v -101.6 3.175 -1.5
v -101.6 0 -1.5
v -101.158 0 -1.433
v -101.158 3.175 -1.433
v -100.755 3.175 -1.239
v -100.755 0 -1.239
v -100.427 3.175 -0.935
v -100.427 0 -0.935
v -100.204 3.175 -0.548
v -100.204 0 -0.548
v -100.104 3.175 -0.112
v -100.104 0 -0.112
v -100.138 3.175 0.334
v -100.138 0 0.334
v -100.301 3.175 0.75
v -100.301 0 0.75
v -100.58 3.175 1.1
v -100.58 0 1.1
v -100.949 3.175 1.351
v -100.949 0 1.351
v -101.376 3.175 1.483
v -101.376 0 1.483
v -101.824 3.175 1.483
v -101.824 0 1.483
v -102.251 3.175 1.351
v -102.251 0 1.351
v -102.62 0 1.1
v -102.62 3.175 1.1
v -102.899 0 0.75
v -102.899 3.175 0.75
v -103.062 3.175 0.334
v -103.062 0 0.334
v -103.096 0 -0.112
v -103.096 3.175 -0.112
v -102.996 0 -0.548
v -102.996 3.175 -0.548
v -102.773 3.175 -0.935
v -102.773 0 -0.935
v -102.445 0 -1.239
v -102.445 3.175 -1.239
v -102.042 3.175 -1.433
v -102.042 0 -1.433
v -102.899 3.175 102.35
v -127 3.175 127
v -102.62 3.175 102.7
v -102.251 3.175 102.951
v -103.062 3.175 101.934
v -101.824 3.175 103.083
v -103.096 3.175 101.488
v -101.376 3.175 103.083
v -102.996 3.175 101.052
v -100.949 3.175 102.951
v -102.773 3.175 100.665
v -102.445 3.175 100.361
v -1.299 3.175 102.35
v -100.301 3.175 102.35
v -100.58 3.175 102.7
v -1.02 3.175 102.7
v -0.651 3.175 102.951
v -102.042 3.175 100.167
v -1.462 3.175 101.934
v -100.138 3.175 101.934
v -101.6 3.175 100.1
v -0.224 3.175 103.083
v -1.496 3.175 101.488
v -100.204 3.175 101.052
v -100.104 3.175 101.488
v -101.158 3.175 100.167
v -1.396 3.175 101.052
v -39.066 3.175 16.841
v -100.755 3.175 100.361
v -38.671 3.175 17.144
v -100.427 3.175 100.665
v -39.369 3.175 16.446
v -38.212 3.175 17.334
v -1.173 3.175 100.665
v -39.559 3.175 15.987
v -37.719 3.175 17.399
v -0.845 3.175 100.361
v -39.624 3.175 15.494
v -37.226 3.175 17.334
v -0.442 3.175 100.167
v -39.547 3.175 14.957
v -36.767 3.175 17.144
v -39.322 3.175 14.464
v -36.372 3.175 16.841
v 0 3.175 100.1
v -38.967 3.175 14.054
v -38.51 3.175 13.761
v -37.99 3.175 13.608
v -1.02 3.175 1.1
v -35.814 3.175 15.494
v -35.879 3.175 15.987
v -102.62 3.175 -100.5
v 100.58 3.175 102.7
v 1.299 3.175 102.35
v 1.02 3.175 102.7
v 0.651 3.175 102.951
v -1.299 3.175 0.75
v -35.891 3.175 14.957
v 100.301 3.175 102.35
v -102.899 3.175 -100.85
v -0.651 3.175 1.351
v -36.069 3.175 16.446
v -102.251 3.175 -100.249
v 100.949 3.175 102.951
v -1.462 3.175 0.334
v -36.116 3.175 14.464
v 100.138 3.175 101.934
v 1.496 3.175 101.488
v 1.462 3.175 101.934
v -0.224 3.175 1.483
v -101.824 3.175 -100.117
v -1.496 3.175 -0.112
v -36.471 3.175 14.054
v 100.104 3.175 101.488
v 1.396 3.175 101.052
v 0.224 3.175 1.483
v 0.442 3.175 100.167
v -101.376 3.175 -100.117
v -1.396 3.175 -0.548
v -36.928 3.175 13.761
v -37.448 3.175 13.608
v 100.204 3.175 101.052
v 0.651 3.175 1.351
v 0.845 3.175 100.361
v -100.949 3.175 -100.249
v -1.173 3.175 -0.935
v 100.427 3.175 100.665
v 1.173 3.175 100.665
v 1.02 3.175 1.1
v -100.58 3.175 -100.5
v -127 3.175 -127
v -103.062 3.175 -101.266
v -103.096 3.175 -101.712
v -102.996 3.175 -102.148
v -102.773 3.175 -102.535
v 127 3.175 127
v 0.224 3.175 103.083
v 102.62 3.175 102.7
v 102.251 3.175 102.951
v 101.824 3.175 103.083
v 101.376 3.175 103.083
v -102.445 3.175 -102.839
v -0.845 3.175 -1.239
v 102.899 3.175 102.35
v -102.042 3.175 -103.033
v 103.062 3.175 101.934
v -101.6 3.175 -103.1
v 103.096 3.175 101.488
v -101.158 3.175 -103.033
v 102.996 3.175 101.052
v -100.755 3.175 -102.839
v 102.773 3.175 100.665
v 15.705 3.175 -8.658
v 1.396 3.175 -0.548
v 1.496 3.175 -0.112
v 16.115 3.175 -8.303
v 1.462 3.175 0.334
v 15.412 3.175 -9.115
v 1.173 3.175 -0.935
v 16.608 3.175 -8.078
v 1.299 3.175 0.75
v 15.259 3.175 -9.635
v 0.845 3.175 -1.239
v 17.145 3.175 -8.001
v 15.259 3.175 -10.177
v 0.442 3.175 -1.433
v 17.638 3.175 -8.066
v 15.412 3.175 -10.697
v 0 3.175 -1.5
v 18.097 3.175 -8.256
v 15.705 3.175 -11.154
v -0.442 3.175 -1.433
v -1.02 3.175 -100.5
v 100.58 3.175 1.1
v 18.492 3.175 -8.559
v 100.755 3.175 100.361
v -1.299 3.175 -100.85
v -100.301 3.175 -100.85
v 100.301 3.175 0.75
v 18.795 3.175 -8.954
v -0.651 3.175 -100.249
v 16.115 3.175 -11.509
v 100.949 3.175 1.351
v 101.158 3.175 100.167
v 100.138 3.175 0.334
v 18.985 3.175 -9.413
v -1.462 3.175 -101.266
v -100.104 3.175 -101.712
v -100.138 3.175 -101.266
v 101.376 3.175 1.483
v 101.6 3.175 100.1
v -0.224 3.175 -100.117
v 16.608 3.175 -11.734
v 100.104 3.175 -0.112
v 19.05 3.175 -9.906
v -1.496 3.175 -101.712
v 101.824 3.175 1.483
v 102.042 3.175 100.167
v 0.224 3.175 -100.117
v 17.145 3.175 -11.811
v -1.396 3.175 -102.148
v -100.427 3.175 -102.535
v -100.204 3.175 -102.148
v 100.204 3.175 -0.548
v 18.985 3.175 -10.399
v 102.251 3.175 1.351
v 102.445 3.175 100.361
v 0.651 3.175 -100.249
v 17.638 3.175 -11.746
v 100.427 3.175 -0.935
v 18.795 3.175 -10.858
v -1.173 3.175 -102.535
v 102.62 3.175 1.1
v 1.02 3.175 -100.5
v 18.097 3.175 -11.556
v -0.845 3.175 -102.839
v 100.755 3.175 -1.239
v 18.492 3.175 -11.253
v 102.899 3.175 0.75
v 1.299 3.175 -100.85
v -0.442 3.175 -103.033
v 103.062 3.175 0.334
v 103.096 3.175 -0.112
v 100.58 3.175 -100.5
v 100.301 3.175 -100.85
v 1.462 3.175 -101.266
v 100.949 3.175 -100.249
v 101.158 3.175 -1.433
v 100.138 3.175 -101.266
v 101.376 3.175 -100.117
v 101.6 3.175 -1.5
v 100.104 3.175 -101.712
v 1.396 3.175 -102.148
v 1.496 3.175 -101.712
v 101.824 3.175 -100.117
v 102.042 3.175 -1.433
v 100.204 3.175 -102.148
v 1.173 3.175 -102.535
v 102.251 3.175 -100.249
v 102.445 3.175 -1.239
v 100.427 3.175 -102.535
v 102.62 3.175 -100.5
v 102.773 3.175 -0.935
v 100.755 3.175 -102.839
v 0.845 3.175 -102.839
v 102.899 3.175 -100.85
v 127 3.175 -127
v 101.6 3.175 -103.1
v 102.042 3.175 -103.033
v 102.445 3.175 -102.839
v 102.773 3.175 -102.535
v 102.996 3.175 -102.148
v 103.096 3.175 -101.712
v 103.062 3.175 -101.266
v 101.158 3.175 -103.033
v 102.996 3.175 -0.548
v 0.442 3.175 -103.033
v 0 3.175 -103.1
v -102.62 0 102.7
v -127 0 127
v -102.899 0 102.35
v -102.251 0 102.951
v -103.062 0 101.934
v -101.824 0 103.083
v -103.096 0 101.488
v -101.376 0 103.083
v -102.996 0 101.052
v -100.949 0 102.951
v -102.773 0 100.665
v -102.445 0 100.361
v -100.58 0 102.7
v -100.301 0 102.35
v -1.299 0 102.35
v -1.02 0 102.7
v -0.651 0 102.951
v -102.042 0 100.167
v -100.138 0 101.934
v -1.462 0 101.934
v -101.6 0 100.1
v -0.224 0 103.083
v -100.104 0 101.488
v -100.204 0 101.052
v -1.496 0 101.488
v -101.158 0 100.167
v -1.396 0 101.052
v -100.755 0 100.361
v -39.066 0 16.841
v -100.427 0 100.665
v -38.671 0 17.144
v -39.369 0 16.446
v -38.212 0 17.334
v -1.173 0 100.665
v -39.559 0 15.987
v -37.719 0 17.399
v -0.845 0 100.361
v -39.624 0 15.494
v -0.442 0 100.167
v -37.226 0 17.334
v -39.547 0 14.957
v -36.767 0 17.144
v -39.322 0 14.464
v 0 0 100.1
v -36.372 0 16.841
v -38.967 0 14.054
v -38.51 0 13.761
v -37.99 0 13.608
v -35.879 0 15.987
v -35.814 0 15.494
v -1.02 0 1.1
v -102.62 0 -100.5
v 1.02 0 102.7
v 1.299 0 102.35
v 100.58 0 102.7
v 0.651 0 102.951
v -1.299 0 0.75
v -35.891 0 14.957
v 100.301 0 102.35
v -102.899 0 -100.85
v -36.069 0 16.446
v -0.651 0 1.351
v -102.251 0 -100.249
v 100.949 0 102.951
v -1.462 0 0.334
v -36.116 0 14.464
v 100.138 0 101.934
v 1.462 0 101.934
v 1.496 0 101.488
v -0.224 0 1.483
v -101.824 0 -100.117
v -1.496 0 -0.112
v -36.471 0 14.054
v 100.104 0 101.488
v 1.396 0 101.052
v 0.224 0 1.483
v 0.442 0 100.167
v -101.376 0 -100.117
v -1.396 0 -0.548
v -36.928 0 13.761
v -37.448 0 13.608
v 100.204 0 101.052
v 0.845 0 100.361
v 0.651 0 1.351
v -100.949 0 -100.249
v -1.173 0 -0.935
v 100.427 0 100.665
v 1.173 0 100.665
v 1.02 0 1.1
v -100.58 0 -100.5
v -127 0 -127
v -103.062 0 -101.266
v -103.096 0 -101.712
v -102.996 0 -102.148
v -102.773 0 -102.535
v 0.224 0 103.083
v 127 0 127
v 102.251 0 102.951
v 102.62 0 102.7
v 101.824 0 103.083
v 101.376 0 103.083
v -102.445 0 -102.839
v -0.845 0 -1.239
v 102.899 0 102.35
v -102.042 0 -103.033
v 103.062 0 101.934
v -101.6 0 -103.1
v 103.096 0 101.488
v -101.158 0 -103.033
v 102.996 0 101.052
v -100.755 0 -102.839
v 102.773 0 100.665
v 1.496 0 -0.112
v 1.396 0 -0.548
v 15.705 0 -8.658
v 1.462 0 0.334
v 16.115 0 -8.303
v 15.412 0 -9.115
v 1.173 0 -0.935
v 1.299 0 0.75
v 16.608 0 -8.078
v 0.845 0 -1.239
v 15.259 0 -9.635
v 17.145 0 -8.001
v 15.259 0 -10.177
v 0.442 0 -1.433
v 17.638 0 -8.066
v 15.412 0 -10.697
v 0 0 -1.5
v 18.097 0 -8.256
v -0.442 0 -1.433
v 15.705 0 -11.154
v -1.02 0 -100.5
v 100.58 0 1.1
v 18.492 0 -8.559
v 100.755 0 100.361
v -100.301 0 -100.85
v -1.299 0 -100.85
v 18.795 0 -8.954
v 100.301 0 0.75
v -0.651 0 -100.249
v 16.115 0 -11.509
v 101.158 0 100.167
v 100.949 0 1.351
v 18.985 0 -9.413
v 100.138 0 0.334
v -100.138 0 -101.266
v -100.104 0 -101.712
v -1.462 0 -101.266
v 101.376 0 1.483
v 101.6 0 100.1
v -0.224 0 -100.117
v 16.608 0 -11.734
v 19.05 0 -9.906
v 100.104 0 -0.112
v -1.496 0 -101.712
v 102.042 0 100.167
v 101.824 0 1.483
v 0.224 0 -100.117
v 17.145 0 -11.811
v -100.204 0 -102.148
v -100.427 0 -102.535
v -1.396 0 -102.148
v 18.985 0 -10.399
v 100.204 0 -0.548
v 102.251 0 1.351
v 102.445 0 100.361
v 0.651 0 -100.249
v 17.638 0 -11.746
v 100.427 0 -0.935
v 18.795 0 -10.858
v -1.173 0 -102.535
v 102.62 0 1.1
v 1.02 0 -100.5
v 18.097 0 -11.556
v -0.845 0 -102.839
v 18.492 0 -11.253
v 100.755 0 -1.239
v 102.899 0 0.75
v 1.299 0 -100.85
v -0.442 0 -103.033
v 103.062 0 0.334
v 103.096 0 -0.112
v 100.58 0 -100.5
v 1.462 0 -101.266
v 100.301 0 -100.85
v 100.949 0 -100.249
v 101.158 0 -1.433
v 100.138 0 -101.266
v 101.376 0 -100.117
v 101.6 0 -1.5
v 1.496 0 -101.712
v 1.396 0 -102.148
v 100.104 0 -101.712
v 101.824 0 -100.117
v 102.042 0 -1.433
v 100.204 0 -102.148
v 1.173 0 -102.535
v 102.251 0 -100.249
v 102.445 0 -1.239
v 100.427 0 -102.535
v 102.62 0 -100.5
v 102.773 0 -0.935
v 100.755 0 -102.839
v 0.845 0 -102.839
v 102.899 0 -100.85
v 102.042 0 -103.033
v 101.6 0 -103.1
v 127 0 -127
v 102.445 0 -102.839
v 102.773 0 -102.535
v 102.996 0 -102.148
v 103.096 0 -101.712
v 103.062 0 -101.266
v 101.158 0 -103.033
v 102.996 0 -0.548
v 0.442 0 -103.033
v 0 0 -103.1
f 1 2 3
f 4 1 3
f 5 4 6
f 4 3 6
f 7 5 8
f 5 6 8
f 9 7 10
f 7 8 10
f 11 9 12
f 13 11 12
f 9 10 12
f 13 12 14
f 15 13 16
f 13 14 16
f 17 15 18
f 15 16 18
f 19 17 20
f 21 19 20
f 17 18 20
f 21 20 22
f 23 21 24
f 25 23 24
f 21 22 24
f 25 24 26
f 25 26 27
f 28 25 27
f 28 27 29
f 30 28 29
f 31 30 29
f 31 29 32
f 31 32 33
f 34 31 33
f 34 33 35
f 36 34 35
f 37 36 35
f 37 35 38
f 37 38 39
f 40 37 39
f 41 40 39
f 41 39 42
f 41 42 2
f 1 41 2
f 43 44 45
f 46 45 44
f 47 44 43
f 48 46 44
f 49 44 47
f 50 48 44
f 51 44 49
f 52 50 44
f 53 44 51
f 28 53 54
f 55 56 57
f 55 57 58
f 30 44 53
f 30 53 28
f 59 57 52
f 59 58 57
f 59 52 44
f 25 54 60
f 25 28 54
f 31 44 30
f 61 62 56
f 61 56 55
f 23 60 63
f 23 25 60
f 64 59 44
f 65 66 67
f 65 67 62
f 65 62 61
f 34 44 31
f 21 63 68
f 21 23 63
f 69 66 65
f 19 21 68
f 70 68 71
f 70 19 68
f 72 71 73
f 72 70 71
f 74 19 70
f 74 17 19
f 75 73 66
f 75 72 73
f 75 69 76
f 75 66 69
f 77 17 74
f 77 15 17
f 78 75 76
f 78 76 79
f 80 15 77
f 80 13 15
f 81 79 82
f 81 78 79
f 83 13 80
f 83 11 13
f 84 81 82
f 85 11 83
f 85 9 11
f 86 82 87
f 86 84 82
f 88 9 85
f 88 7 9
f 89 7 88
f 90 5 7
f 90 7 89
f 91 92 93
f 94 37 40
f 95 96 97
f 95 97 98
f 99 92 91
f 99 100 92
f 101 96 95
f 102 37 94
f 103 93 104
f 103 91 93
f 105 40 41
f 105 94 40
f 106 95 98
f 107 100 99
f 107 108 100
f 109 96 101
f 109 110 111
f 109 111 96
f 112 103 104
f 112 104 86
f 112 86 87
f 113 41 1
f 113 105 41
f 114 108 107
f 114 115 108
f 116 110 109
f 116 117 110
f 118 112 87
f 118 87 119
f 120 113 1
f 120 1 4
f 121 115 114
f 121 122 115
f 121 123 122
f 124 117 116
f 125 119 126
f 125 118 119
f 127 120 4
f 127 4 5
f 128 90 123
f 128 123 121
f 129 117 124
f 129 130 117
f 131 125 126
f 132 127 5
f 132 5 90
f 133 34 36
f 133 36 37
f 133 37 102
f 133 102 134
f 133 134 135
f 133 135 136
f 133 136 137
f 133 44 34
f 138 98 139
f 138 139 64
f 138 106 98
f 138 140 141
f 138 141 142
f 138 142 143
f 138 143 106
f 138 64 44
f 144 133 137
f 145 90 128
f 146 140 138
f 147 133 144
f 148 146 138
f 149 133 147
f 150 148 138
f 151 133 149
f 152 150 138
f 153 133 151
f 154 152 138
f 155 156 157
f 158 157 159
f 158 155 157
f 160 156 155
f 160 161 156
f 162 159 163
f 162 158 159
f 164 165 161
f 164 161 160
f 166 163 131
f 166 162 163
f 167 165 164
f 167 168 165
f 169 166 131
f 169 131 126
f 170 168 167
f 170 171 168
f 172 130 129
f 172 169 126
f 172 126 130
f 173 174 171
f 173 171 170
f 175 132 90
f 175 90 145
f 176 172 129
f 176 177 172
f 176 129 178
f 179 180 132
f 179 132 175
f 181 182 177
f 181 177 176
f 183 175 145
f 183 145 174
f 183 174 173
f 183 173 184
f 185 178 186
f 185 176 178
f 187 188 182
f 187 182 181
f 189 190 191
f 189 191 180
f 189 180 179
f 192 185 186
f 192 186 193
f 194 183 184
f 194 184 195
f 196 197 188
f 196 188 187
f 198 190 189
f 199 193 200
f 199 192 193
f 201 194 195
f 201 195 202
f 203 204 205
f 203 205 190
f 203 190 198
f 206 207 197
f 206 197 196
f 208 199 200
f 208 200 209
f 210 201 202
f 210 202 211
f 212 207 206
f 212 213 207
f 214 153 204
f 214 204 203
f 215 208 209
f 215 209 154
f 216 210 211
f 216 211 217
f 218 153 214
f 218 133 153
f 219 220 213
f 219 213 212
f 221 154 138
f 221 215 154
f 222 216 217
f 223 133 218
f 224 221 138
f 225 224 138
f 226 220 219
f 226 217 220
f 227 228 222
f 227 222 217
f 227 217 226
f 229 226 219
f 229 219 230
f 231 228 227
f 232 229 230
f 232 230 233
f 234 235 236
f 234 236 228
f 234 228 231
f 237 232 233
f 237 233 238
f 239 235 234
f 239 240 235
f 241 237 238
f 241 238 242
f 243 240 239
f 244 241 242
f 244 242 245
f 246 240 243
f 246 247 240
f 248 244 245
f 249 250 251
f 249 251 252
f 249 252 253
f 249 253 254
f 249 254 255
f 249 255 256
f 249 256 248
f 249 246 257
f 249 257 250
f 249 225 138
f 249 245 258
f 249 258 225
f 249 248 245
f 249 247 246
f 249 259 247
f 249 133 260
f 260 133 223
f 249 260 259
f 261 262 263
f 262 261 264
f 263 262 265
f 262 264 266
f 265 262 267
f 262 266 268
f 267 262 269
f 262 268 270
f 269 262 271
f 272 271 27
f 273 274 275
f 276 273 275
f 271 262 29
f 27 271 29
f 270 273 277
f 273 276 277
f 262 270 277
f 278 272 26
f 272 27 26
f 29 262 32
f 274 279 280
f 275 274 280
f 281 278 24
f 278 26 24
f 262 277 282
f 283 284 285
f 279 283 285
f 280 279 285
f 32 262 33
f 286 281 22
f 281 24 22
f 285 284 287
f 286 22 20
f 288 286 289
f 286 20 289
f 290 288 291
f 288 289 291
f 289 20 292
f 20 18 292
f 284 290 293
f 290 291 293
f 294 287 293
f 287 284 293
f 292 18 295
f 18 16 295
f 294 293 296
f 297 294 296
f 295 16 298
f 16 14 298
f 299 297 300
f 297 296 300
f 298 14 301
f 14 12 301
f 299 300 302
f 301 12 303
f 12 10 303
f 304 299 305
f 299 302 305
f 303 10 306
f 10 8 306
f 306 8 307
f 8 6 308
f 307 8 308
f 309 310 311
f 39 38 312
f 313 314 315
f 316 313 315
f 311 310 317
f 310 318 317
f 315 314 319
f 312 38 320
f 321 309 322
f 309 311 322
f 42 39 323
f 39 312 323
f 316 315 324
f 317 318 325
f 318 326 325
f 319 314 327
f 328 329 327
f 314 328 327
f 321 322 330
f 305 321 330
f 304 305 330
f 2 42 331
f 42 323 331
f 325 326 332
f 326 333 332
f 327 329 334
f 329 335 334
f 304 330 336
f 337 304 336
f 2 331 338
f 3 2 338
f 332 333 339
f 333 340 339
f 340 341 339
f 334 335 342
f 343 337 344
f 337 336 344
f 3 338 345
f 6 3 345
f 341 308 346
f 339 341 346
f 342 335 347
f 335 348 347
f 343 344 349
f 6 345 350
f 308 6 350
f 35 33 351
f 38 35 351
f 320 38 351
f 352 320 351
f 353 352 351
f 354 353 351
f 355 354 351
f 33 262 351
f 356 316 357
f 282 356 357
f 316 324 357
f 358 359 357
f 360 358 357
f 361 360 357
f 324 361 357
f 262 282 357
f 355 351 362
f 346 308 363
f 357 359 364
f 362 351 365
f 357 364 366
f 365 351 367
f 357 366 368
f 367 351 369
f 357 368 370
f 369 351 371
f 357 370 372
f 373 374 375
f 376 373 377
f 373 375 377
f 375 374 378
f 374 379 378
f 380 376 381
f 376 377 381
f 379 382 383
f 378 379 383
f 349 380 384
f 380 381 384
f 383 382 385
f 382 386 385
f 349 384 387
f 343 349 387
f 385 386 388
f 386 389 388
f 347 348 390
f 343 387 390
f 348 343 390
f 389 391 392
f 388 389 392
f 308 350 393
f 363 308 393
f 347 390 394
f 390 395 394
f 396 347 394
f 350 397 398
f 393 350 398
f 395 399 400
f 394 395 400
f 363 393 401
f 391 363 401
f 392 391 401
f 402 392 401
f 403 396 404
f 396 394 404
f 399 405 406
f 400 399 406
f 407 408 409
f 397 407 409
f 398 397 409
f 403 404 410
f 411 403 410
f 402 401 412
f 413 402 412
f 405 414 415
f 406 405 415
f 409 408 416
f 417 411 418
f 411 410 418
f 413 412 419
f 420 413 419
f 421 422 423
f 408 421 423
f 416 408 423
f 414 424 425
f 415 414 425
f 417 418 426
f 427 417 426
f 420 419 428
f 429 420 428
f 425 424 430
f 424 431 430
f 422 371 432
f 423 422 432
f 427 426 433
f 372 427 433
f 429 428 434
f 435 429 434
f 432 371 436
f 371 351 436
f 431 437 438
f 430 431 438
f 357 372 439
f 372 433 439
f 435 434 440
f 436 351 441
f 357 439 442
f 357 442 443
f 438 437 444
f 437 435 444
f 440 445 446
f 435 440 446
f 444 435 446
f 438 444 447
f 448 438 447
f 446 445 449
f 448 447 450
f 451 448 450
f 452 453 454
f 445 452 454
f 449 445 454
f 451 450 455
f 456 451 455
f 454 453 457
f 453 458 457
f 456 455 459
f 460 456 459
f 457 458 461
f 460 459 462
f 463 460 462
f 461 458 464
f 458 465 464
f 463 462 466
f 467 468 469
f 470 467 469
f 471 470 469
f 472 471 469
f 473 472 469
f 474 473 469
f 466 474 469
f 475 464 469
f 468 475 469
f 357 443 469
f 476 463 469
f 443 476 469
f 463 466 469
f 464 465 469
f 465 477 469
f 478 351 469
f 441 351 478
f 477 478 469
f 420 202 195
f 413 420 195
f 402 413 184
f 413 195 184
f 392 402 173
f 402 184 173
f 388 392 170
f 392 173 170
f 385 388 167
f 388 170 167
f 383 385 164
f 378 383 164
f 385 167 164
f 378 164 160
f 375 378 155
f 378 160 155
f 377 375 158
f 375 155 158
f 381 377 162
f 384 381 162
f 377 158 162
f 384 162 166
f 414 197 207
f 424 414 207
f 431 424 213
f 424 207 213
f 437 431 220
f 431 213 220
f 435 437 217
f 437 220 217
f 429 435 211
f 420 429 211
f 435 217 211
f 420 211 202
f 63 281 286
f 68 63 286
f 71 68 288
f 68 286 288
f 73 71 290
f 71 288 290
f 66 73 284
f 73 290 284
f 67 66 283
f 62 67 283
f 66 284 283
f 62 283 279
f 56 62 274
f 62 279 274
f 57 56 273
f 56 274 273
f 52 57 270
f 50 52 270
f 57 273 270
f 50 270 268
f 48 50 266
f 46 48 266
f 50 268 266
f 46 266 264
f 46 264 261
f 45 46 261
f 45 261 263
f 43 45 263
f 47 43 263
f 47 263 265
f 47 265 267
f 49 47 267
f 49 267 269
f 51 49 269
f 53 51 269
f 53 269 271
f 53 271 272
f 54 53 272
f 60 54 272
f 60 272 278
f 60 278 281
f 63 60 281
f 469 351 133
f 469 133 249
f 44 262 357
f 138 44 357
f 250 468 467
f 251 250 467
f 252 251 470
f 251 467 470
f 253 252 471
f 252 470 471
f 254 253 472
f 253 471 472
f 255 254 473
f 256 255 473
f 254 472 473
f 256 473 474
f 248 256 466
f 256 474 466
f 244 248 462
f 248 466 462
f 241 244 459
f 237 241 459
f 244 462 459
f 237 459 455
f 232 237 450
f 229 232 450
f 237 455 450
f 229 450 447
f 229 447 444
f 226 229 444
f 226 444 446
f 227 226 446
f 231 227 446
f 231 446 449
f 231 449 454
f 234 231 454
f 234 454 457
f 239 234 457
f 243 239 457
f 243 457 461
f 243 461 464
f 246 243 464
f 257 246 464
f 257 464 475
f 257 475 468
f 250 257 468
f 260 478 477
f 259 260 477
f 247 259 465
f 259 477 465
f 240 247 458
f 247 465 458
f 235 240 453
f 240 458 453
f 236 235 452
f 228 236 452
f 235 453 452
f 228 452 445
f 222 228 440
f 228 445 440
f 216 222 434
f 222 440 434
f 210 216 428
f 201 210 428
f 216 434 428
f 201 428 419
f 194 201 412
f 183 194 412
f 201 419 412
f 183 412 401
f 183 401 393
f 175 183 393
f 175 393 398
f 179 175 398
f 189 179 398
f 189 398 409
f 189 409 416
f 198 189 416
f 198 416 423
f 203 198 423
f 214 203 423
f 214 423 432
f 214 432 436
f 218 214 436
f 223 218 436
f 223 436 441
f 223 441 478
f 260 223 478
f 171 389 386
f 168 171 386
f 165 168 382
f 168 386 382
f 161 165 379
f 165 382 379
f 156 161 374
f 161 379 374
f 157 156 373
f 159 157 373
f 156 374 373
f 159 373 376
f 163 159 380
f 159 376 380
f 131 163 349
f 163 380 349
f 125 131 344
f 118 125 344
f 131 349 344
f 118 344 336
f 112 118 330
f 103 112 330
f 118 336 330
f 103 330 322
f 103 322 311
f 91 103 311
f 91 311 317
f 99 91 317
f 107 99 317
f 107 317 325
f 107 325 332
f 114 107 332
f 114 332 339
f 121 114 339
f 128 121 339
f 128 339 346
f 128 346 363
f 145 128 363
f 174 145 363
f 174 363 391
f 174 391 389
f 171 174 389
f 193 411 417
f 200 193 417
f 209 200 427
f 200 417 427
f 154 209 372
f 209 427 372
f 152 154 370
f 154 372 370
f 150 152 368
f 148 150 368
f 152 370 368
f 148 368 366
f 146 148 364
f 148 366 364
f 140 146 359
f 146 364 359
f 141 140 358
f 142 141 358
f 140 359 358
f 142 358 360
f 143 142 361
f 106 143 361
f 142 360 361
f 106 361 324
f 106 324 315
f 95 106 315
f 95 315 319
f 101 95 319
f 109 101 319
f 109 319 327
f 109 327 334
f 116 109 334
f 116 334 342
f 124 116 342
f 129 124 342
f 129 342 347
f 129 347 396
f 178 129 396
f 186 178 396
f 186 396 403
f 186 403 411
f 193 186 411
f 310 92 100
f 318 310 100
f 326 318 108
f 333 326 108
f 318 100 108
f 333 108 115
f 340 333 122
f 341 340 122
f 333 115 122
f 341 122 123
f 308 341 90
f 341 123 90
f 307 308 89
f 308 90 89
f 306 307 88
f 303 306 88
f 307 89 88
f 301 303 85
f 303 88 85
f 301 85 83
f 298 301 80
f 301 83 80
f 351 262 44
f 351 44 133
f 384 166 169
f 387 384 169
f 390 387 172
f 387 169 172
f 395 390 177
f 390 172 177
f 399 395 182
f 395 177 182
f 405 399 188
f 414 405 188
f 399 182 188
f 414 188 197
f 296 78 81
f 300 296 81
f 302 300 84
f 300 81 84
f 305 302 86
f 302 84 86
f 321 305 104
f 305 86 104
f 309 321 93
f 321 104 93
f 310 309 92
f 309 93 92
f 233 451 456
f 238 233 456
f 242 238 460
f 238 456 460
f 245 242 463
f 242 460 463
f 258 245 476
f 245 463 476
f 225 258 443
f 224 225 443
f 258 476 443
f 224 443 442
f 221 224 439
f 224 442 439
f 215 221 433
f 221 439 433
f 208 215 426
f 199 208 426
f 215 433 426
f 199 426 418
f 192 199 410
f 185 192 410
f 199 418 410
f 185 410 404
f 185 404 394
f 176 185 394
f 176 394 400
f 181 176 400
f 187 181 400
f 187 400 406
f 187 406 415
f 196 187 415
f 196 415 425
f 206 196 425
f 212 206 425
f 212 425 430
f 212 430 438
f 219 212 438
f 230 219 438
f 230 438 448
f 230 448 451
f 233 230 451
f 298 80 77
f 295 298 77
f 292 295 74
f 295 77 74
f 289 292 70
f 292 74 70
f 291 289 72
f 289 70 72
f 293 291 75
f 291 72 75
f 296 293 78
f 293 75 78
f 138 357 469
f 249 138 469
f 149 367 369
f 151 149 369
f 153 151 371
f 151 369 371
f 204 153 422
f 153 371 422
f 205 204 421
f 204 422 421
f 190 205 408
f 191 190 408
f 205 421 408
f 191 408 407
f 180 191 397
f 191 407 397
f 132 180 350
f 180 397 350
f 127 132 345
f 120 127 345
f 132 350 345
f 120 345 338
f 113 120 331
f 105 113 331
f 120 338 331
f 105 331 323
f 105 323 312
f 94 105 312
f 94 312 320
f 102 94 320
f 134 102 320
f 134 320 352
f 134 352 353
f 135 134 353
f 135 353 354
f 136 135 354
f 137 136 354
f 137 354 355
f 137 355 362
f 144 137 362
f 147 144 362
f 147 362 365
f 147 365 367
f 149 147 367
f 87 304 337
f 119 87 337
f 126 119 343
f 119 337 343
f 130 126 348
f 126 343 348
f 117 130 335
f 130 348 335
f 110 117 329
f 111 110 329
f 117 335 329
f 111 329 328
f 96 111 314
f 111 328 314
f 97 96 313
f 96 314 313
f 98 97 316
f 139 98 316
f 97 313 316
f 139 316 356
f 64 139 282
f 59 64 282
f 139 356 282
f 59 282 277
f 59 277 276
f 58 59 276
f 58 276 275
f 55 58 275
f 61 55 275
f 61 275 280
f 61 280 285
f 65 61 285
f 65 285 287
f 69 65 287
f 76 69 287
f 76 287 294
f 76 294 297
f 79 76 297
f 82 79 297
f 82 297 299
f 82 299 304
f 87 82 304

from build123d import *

# Parameters (mm, degrees)
SKETCH1_W             = 254
SKETCH1_H             = 254
BOSS_EXTRUDE1_DEPTH   = 3.175
F_3_0MM_DOWEL_HOLE1_D = 3
CUT_EXTRUDE1_DEPTH    = 180.63318353


with BuildPart() as part:
    # Sketch1 → Boss-Extrude1 (new body)
    with BuildSketch(Plane(origin=(0, 0, 0), x_dir=(1, 0, 0), z_dir=(0, 1, 0))):
        Rectangle(SKETCH1_W, SKETCH1_H)
    extrude(amount=BOSS_EXTRUDE1_DEPTH)

    # Ø3.0mm Dowel Hole1 (through all)
    with Locations(Plane.ZX.offset(3.175)):
        with Locations((0, 0), (0, -101.6), (0, 101.6), (101.6, 101.6), (101.6, 0), (101.6, -101.6), (-101.6, -101.6), (-101.6, 0), (-101.6, 101.6)):
            Hole(F_3_0MM_DOWEL_HOLE1_D / 2)

    # Sketch5 → Cut-Extrude1 (cut, through all)
    with BuildSketch(Plane(origin=(0, 3.175, 0), x_dir=(1, 0, 0), z_dir=(0, 1, 0))):
        with BuildLine():
            ThreePointArc((17.145, 11.811), (15.24, 9.906), (17.145, 8.001))
            Line((17.145, 8.001), (17.145, 9.906))
            Line((17.145, 9.906), (17.145, 11.811))
        make_face()
        with BuildLine():
            Line((17.145, 9.906), (17.145, 8.001))
            ThreePointArc((17.145, 8.001), (18.492038418, 8.558961582), (19.05, 9.906))
            Line((19.05, 9.906), (17.145, 9.906))
        make_face()
        with BuildLine():
            Line((17.145, 11.811), (17.145, 9.906))
            Line((17.145, 9.906), (19.05, 9.906))
            ThreePointArc((19.05, 9.906), (18.492038418, 11.253038418), (17.145, 11.811))
        make_face()
        with BuildLine():
            ThreePointArc((-39.624, -15.494), (-39.066038418, -16.841038418), (-37.719, -17.399))
            Line((-37.719, -17.399), (-37.719, -15.494))
            Line((-37.719, -15.494), (-39.624, -15.494))
        make_face()
        with BuildLine():
            Line((-37.719, -15.494), (-37.719, -17.399))
            ThreePointArc((-37.719, -17.399), (-36.371961582, -16.841038418), (-35.814, -15.494))
            ThreePointArc((-35.814, -15.494), (-37.719, -13.589), (-39.624, -15.494))
            Line((-39.624, -15.494), (-37.719, -15.494))
        make_face()
    extrude(amount=-CUT_EXTRUDE1_DEPTH, mode=Mode.SUBTRACT)


solid = part.part
